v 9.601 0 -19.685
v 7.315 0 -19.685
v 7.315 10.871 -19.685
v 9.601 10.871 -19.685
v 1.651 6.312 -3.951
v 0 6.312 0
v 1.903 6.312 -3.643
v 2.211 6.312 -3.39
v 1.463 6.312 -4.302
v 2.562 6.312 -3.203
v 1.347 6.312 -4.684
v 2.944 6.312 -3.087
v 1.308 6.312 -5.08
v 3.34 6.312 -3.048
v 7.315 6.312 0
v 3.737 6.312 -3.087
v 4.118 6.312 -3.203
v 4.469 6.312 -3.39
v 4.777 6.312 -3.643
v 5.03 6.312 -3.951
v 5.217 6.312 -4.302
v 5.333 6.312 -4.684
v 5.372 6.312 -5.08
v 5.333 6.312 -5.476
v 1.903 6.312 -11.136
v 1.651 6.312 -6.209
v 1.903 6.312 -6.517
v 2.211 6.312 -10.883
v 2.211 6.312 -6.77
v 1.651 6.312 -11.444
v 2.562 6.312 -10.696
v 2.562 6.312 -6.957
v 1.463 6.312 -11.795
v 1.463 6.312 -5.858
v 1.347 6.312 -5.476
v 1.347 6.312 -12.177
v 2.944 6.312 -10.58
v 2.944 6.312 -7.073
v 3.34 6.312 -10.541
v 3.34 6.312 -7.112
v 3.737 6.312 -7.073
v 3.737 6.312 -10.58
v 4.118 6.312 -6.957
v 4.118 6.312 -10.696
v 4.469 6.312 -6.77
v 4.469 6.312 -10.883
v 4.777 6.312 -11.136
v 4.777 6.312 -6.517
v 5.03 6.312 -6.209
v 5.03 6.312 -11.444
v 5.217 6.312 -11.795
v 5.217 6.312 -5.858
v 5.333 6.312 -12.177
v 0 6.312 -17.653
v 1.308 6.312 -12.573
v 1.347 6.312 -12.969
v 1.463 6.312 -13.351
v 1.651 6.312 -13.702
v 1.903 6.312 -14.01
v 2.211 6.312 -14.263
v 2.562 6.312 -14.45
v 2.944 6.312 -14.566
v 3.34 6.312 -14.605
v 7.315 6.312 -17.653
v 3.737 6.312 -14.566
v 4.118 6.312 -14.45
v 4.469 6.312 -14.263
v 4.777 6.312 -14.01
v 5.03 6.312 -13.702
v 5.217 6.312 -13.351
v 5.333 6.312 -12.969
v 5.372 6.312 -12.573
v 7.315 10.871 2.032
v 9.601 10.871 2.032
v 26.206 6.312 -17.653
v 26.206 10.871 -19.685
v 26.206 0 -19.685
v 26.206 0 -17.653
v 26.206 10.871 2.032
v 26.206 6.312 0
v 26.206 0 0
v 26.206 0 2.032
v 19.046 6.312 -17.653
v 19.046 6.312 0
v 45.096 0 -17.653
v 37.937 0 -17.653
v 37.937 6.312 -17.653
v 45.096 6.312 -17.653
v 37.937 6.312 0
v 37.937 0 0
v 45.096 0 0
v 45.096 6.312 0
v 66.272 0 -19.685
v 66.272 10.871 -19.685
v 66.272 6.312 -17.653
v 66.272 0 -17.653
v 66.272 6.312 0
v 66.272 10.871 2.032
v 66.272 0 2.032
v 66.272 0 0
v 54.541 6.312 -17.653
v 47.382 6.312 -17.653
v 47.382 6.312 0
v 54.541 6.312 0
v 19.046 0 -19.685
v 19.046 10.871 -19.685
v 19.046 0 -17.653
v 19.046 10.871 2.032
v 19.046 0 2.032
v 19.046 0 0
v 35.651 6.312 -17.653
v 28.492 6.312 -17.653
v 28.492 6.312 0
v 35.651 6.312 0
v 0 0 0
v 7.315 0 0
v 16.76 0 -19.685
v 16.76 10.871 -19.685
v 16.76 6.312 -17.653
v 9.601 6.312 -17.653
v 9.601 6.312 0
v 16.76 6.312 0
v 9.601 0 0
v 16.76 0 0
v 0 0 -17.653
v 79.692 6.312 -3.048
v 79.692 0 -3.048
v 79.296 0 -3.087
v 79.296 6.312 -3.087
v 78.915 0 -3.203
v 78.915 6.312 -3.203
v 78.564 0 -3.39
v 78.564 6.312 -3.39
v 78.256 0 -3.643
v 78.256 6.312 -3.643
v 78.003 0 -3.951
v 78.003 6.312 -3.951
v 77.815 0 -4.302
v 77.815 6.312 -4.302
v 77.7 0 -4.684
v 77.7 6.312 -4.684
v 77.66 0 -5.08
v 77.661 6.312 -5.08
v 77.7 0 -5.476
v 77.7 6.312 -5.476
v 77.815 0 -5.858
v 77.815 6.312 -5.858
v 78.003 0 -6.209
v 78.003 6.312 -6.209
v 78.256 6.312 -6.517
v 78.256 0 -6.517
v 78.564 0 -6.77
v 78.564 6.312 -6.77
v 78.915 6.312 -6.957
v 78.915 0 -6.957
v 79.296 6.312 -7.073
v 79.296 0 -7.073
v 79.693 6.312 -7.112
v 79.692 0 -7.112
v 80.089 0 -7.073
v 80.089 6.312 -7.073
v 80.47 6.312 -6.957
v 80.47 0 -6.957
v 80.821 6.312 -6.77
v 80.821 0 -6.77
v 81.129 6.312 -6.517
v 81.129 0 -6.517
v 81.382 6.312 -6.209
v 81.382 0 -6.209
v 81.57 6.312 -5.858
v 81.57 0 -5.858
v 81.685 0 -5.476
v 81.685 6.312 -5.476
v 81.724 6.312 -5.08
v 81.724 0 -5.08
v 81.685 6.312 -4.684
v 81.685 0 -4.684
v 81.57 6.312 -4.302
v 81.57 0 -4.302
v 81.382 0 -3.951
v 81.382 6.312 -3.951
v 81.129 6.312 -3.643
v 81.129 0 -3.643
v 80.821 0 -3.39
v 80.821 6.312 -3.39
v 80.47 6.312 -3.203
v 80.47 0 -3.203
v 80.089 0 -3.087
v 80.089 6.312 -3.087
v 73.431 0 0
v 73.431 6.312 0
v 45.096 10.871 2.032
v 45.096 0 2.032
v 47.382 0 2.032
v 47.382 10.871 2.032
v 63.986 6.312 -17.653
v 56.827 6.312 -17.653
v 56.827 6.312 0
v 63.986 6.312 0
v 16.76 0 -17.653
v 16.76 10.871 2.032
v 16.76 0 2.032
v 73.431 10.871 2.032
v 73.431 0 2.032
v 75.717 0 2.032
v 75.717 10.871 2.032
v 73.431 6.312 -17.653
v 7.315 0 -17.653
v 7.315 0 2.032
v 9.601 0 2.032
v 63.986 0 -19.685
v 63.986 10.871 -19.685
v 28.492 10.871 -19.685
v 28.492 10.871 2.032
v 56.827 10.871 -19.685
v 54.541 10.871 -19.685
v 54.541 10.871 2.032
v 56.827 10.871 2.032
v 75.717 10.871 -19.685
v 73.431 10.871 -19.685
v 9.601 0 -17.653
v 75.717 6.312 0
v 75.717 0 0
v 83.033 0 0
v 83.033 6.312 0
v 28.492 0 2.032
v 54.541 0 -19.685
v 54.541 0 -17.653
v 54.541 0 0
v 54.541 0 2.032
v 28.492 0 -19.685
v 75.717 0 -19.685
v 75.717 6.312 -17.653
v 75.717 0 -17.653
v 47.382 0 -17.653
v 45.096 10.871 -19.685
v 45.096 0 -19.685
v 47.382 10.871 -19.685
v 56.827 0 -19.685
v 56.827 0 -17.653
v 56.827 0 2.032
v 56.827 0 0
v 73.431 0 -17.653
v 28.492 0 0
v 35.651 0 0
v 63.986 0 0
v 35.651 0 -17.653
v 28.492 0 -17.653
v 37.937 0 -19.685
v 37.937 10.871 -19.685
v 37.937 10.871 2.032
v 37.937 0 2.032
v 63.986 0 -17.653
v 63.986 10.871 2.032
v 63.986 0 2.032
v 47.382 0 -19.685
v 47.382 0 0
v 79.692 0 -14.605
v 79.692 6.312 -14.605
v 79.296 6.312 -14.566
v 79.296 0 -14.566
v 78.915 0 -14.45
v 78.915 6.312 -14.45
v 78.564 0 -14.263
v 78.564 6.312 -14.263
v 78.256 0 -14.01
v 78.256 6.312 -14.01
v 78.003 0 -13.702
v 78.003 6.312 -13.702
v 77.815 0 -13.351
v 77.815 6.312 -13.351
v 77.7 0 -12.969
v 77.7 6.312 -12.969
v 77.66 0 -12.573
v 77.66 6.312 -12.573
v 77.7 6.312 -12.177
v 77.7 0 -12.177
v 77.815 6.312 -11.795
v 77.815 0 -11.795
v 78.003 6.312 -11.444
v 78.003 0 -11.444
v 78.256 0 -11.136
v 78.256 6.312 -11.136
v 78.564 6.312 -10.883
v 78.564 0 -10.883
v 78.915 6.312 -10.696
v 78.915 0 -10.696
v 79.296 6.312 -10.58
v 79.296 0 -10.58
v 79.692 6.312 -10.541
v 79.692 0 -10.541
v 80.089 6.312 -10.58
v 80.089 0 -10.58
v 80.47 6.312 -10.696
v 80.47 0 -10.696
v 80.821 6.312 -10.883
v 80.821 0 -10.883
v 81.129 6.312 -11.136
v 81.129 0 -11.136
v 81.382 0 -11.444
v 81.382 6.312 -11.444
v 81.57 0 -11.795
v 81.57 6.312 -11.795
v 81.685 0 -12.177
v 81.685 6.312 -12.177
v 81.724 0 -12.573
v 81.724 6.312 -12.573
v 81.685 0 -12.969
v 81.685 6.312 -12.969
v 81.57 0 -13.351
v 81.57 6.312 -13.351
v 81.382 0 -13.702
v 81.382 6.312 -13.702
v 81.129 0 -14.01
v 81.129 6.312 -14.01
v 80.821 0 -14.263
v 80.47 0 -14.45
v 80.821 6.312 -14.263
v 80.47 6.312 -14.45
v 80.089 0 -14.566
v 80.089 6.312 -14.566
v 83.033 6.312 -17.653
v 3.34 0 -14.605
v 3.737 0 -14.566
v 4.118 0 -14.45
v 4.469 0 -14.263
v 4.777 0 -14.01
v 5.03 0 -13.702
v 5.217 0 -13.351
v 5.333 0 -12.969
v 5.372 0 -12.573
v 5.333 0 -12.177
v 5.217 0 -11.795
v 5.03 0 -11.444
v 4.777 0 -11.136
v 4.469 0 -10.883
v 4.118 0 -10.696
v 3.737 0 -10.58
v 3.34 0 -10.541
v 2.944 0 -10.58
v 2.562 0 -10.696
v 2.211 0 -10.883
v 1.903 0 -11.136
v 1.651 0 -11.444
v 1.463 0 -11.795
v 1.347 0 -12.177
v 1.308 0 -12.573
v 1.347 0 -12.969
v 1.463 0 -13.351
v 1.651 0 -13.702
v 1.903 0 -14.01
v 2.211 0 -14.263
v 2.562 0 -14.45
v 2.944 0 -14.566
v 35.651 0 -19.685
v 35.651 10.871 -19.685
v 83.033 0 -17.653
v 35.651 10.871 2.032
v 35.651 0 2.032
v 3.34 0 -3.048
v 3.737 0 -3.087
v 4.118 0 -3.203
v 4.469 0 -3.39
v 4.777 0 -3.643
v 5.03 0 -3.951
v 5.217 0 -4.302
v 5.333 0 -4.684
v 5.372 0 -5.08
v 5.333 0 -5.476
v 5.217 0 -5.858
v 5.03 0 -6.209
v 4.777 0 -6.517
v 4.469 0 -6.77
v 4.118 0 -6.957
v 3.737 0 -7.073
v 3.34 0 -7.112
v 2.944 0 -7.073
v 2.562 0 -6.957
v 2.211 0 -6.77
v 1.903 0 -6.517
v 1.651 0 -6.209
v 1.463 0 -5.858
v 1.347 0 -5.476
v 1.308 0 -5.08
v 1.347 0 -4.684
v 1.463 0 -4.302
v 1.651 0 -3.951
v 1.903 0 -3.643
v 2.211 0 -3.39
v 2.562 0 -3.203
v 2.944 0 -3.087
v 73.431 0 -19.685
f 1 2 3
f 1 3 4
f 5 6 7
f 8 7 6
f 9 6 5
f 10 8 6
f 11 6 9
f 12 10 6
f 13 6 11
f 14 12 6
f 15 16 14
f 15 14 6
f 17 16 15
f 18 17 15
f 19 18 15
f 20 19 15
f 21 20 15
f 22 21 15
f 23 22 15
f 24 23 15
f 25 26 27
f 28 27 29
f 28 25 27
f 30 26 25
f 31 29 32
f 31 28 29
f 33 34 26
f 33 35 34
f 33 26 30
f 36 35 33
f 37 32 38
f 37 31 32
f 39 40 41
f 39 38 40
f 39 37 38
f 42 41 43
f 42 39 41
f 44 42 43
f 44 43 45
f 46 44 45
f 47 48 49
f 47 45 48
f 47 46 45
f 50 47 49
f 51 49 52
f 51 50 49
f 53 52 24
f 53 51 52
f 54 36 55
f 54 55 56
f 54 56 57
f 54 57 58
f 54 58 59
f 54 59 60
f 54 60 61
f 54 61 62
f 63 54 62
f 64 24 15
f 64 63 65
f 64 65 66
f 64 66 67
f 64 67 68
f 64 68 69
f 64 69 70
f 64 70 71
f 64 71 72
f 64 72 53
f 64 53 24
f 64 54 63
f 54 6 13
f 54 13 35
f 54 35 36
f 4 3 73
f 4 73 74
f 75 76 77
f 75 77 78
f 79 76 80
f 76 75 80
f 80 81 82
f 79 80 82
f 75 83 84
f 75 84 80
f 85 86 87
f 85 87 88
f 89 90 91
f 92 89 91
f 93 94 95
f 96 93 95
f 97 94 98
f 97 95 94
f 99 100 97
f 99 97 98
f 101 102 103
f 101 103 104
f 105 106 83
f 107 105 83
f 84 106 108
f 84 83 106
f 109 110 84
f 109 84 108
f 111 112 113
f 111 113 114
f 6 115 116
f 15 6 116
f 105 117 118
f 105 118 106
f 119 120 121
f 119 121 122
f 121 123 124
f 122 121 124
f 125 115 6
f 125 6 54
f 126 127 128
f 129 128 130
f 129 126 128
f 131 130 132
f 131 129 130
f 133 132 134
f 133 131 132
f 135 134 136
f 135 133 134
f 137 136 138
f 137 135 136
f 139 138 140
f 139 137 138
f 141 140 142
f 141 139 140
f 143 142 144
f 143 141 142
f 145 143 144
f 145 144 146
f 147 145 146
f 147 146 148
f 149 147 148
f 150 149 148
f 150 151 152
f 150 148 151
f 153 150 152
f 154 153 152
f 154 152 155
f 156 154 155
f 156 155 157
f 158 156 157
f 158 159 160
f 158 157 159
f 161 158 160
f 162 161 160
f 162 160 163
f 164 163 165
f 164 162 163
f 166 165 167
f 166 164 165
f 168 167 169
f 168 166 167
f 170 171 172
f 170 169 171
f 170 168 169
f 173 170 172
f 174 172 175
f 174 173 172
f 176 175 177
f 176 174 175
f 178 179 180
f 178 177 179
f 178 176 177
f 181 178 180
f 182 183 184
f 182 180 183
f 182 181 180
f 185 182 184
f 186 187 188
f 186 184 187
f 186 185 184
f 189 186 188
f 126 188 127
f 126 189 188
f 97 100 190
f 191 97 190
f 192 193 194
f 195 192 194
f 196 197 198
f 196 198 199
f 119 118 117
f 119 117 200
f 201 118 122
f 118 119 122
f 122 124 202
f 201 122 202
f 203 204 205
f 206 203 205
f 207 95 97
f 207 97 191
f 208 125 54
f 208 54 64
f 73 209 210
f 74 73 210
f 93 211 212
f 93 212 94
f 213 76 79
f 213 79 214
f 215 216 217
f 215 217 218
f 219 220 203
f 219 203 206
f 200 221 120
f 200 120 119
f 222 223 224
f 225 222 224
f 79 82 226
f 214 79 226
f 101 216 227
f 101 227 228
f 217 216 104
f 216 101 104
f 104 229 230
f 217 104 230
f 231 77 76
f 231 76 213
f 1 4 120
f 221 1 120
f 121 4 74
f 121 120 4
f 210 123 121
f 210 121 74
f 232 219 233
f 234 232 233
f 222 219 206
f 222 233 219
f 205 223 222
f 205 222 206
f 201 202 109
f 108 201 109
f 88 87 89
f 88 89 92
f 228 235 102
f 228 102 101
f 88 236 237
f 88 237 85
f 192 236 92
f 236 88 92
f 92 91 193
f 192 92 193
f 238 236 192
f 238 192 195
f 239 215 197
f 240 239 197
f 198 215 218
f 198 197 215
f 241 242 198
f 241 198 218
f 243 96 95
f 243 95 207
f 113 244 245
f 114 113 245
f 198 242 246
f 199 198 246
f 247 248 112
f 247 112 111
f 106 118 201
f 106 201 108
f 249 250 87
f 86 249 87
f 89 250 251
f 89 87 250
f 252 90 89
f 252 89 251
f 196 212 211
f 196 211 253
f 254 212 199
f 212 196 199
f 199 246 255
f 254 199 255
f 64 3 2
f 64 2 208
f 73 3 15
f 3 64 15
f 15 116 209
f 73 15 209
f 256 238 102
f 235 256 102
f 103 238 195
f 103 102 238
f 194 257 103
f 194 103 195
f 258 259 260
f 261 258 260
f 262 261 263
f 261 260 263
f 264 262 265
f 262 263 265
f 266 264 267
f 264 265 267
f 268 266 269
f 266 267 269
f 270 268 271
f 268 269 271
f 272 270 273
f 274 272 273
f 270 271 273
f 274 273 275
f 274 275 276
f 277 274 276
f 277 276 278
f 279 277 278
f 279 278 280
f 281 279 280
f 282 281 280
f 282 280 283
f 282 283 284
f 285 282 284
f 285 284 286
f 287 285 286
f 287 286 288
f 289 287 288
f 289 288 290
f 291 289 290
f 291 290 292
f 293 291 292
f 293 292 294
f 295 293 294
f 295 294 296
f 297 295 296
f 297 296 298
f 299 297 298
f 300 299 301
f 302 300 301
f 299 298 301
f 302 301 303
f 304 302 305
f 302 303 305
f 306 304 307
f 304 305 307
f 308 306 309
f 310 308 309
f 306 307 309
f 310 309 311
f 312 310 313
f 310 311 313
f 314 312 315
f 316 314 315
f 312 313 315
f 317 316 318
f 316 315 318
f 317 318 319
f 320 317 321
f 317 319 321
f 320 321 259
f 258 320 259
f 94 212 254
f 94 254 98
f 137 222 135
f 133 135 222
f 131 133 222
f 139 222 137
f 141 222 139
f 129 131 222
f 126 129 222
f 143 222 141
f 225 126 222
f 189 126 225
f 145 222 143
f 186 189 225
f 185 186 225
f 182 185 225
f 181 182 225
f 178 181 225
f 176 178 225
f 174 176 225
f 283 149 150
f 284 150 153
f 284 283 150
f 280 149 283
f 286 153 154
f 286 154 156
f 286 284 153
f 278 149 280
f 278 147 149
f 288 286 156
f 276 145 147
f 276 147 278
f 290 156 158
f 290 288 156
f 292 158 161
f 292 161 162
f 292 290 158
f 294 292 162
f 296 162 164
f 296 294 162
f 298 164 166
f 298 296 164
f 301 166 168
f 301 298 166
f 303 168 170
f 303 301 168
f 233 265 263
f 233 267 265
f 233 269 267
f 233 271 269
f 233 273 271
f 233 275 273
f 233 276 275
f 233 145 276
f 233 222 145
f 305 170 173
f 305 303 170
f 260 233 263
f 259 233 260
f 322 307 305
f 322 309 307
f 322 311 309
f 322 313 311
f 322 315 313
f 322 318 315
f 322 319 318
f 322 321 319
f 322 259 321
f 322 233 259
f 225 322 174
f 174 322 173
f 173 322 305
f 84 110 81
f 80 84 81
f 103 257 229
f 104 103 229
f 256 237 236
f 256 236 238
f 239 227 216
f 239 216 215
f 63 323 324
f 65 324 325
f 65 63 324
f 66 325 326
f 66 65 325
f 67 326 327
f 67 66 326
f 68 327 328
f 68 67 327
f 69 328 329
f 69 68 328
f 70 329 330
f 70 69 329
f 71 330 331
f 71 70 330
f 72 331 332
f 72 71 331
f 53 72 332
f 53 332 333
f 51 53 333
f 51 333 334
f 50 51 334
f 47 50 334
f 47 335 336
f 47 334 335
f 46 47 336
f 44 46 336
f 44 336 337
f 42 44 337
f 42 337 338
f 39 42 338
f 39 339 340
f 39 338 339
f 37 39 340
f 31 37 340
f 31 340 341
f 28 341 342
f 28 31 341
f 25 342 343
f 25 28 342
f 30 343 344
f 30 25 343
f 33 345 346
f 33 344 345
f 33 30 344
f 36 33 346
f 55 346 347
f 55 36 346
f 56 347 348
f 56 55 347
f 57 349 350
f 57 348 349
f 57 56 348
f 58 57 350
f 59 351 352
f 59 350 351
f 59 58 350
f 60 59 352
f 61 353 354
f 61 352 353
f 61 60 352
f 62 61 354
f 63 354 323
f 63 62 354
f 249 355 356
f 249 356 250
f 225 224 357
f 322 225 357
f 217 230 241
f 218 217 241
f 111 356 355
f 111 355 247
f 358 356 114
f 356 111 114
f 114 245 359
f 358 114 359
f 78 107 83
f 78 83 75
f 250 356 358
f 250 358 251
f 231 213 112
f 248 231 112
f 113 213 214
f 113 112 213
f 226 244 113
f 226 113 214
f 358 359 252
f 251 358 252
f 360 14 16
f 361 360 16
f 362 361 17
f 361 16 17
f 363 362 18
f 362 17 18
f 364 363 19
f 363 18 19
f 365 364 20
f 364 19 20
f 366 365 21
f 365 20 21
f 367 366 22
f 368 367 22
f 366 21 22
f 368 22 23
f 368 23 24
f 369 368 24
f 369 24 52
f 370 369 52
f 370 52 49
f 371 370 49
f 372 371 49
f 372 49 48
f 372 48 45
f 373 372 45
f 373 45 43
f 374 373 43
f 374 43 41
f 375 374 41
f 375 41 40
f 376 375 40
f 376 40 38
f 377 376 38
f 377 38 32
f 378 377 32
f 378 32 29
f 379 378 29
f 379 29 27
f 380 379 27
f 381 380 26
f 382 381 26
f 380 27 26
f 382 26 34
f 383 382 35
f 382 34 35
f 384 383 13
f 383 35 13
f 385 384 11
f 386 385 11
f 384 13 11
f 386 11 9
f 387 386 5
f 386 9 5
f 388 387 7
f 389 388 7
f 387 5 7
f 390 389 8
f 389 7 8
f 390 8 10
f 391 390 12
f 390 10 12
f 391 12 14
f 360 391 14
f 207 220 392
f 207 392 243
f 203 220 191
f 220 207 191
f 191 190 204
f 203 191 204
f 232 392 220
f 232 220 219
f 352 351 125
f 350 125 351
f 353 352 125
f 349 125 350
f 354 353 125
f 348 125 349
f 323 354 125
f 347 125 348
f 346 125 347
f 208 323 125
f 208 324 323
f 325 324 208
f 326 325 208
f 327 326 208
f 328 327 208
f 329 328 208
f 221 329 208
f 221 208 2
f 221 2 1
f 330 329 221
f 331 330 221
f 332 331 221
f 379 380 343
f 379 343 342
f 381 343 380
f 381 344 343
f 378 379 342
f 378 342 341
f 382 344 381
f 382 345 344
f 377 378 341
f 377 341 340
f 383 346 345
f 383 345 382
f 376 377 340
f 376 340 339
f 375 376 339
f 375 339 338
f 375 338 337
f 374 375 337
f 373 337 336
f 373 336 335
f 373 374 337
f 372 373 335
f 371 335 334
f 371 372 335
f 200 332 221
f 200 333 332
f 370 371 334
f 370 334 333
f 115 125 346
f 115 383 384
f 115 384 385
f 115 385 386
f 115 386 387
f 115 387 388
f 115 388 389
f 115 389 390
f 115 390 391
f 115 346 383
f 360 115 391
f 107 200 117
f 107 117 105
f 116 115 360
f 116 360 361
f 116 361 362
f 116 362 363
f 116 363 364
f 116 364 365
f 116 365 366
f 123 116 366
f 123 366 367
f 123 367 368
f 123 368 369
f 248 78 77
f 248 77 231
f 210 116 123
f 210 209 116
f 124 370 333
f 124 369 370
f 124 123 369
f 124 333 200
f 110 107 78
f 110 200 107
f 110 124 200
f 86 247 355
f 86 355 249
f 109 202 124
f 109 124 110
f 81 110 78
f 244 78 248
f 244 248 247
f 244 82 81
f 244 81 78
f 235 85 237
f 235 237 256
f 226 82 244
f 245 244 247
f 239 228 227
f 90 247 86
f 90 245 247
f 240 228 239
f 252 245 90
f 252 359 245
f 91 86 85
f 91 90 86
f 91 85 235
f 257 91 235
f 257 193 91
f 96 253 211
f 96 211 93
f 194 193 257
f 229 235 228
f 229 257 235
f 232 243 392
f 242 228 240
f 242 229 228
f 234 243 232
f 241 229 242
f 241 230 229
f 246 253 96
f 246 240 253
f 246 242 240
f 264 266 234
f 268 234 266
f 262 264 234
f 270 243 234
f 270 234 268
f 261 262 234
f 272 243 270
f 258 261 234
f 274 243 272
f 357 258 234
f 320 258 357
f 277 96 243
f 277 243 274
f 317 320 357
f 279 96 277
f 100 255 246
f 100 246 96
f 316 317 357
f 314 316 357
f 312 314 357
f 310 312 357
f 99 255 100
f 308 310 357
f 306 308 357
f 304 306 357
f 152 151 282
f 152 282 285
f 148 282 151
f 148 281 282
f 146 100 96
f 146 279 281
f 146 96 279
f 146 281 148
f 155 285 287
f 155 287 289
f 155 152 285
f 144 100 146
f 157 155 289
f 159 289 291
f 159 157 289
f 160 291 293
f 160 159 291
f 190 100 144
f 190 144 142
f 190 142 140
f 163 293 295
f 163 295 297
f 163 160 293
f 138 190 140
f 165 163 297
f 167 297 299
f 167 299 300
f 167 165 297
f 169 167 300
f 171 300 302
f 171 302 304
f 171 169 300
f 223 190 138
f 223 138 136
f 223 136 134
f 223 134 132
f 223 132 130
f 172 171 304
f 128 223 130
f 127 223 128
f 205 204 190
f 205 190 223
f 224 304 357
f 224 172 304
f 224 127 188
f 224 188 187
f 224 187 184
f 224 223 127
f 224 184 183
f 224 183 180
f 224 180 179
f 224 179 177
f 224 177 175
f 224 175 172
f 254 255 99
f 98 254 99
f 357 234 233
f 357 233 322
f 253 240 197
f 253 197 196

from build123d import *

# Parameters (mm, degrees)
SKETCH1_W               = 83.0326
SKETCH1_H               = 17.653
BOSS_EXTRUDE1_DEPTH     = 6.3119
SKETCH5_W               = 2.286
SKETCH5_H               = 21.717
BOSS_EXTRUDE5_DEPTH     = 10.8712
LPATTERN2_COUNT         = 8
LPATTERN2_PITCH         = 9.445171429
SKETCH9_R               = 2.032
CUT_EXTRUDE1_DEPTH      = 86.567236542
MIRROR2_COPY_1_SKETCH_R = 2.032
MIRROR2_COPY_1_DEPTH    = 86.567236542


with BuildPart() as part:
    # Sketch1 → Boss-Extrude1 (new body)
    with BuildSketch(Plane(origin=(0, 0, 0), x_dir=(1, 0, 0), z_dir=(0, 1, 0))):
        with Locations((41.5163, 8.8265)):
            Rectangle(SKETCH1_W, SKETCH1_H)
    extrude(amount=BOSS_EXTRUDE1_DEPTH)

    # Sketch5 → Boss-Extrude5 (add)
    with BuildSketch(Plane.XZ):
        with Locations((8.4582, -8.8265)):
            Rectangle(SKETCH5_W, SKETCH5_H)
    boss_extrude5 = extrude(amount=-BOSS_EXTRUDE5_DEPTH)

    # LPattern2: Boss-Extrude5 ×8
    with Locations(*[(i * LPATTERN2_PITCH, 0, 0) for i in range(1, LPATTERN2_COUNT)]):
        add(boss_extrude5)

    # Sketch9 → Cut-Extrude1 (cut, through all)
    with BuildSketch(Plane(origin=(0, 6.3119, 0), x_dir=(1, 0, 0), z_dir=(0, 1, 0))):
        with Locations(Location((3.3401, 5.08, 0), (0, 0, 270))):
            Circle(SKETCH9_R)
    cut_extrude1 = extrude(amount=-CUT_EXTRUDE1_DEPTH, mode=Mode.SUBTRACT)

    # Mirror1: Cut-Extrude1 across plane
    add(cut_extrude1.mirror(Plane.XY.offset(-8.8265)), mode=Mode.SUBTRACT)

    # Mirror2: Cut-Extrude1 across plane
    add(cut_extrude1.mirror(Plane.ZY.offset(-41.5163)), mode=Mode.SUBTRACT)

    # Mirror2 copy 1 sketch → Mirror2 copy 1 (cut, through all)
    with BuildSketch(Plane(origin=(83.0326, 6.3119, -17.653), x_dir=(-1, 0, 0), z_dir=(0, 1, 0))):
        with Locations(Location((3.3401, 5.08, 0), (0, 0, 270))):
            Circle(MIRROR2_COPY_1_SKETCH_R)
    extrude(amount=-MIRROR2_COPY_1_DEPTH, mode=Mode.SUBTRACT)


solid = part.part
